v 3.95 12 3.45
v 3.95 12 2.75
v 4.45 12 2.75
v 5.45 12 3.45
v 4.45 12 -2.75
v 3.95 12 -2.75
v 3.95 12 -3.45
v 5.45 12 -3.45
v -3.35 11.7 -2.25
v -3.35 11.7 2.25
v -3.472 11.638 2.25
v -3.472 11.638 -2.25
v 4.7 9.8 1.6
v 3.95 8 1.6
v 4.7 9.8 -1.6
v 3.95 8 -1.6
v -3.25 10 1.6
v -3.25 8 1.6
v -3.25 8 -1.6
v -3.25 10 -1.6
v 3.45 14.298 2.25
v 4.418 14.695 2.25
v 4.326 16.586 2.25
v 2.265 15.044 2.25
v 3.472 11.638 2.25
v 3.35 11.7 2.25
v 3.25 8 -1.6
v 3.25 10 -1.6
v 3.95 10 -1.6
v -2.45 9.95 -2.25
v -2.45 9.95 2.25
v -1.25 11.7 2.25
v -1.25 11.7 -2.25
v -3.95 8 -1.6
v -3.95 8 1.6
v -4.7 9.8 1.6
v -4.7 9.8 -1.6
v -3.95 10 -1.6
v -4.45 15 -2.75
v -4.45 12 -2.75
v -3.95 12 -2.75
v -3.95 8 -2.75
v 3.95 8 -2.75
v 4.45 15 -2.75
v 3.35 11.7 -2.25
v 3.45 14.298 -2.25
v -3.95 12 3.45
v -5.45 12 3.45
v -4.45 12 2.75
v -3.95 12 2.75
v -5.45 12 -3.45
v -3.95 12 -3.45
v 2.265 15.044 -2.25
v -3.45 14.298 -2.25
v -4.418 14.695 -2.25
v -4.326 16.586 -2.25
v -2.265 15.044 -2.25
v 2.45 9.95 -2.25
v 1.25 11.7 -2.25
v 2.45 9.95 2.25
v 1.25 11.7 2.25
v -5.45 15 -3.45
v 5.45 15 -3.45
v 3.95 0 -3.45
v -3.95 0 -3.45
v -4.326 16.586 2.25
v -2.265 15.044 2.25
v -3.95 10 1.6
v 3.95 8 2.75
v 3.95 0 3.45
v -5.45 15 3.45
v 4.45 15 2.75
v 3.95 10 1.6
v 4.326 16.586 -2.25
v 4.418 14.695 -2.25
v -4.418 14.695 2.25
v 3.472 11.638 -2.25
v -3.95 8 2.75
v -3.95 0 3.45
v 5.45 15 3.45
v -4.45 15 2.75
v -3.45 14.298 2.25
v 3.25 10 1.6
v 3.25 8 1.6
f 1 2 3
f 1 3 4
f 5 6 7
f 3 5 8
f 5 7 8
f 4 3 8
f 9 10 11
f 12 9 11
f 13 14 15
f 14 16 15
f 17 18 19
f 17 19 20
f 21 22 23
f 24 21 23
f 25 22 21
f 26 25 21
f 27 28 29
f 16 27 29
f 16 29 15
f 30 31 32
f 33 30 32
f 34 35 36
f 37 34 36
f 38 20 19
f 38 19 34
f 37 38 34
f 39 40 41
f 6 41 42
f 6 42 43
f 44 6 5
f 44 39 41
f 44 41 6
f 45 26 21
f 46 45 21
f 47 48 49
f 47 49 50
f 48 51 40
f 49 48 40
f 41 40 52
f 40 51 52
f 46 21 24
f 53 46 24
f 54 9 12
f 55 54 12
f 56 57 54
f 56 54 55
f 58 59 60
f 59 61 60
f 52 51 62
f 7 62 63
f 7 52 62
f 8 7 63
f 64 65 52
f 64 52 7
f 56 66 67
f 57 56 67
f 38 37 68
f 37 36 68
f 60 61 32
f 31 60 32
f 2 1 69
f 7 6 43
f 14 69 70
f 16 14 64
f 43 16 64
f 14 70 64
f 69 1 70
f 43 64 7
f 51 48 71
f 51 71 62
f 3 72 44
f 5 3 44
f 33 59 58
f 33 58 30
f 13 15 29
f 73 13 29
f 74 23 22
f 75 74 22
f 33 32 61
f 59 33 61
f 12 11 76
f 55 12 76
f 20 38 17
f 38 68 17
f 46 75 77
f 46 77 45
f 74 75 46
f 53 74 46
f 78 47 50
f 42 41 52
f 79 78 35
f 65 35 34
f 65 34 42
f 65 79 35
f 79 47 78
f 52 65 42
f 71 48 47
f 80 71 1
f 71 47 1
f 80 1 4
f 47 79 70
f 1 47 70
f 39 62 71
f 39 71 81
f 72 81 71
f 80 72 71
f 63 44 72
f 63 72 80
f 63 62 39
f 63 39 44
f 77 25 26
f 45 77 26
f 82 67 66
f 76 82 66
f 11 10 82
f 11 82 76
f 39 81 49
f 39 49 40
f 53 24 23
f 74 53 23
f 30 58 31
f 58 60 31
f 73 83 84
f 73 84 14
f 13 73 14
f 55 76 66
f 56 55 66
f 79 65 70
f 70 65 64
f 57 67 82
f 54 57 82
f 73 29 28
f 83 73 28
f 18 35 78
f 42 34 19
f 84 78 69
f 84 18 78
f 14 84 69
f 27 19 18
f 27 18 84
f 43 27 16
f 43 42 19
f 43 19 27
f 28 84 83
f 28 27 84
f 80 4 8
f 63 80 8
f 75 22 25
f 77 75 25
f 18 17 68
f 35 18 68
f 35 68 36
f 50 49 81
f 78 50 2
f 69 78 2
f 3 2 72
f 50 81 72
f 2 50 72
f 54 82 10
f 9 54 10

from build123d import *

# Parameters (mm, degrees)
SKETCH1_W                       = 7.9
SKETCH1_H                       = 6.9
BOSS_EXTRUDE1_DEPTH             = 12
SKETCH2_W                       = 10.9
SKETCH2_H                       = 6.9
BOSS_EXTRUDE2_DEPTH             = 3
SKETCH3_W                       = 8.9
SKETCH3_H                       = 5.5
CUT_EXTRUDE1_DEPTH              = 7
SKETCH4_W                       = 0.7
SKETCH4_H                       = 2
BOSS_EXTRUDE3_DEPTH             = 1.6
BOSS_EXTRUDE3_DEPTH_BACK        = 1.6
BOSS_EXTRUDE4_DEPTH             = 2.25
BOSS_EXTRUDE4_DEPTH_BACK        = 2.25
BOSS_EXTRUDE5_REACH             = 18.328
BOSS_EXTRUDE5_DIRECTION_2_REACH = 18.328


with BuildPart() as part:
    # Sketch1 → Boss-Extrude1 (new body)
    with BuildSketch(Plane(origin=(0, 0, 0), x_dir=(1, 0, 0), z_dir=(0, 1, 0))):
        Rectangle(SKETCH1_W, SKETCH1_H)
    extrude(amount=BOSS_EXTRUDE1_DEPTH)

    # Sketch2 → Boss-Extrude2 (add)
    with BuildSketch(Plane(origin=(0, 12, 0), x_dir=(1, 0, 0), z_dir=(0, 1, 0))):
        Rectangle(SKETCH2_W, SKETCH2_H)
    extrude(amount=BOSS_EXTRUDE2_DEPTH)

    # Sketch3 → Cut-Extrude1 (cut)
    with BuildSketch(Plane(origin=(0, 15, 0), x_dir=(1, 0, 0), z_dir=(0, 1, 0))):
        Rectangle(SKETCH3_W, SKETCH3_H)
    extrude(amount=-CUT_EXTRUDE1_DEPTH, mode=Mode.SUBTRACT)

    # Sketch4 → Boss-Extrude3 (add, two sides)
    with BuildSketch(Plane.XY) as boss_extrude3_sk:
        Polygon((-3.95, 10), (-3.95, 8), (-4.7, 9.8), align=None)
        with Locations((-3.6, 9)):
            Rectangle(SKETCH4_W, SKETCH4_H)
    boss_extrude3 = extrude(amount=BOSS_EXTRUDE3_DEPTH)
    boss_extrude3 = boss_extrude3 + extrude(boss_extrude3_sk.sketch, amount=-BOSS_EXTRUDE3_DEPTH_BACK)

    # Mirror1: Boss-Extrude3 across plane
    add(boss_extrude3.mirror(Plane(origin=(0, 0, 0), x_dir=(0, 0, 1), z_dir=(1, 0, 0))))


with BuildPart() as body_2:
    # Sketch5 → Boss-Extrude4 (new, two sides)
    with BuildSketch(Plane.XY) as boss_extrude4_sk:
        Polygon((-1.25, 11.7), (1.25, 11.7), (2.45, 9.95), (-2.45, 9.95), align=None)
    extrude(amount=BOSS_EXTRUDE4_DEPTH)
    extrude(boss_extrude4_sk.sketch, amount=-BOSS_EXTRUDE4_DEPTH_BACK)


with BuildPart() as body_3:

    # Boss-Extrude5: up to this face of the body (flat: up to its plane)
    boss_extrude5_end = Plane(body_2.part.faces().sort_by_distance((0, 10.730405405, 2.25))[0])
    # Sketch6 → Boss-Extrude5 (new, up to the picked face)
    with BuildSketch(Plane.XY, mode=Mode.PRIVATE) as boss_extrude5_sk1:
        Polygon((3.471778858, 11.63828639), (3.35, 11.7), (3.449808304, 14.298083583), (2.265137871, 15.044110369), (4.325591119, 16.585526334), (4.418044618, 14.695177149), align=None)
    boss_extrude5_tool1 = split(extrude(boss_extrude5_sk1.sketch, amount=BOSS_EXTRUDE5_REACH, mode=Mode.PRIVATE), bisect_by=boss_extrude5_end, keep=Keep.BOTH, mode=Mode.PRIVATE)
    # Sketch6 → Boss-Extrude5 (new, up to the picked face)
    with BuildSketch(Plane.XY, mode=Mode.PRIVATE) as boss_extrude5_sk2:
        Polygon((-4.325591119, 16.585526334), (-2.265137871, 15.044110369), (-3.449808304, 14.298083583), (-3.35, 11.7), (-3.471778858, 11.63828639), (-4.418044618, 14.695177149), align=None)
    boss_extrude5_tool2 = split(extrude(boss_extrude5_sk2.sketch, amount=BOSS_EXTRUDE5_REACH, mode=Mode.PRIVATE), bisect_by=boss_extrude5_end, keep=Keep.BOTH, mode=Mode.PRIVATE)
    add(boss_extrude5_tool1.solids().sort_by(Axis((3.652081, 14.612353, 0), (0, 0, 1)))[0])
    add(boss_extrude5_tool2.solids().sort_by(Axis((-3.652081, 14.612353, 0), (0, 0, 1)))[0])


    # Boss-Extrude5 direction 2: up to this face of the body (flat: up to its plane)
    boss_extrude5_direction_2_end = Plane(body_2.part.faces().sort_by_distance((0, 10.730405405, -2.25))[0])
    # Sketch6 → Boss-Extrude5 direction 2 (add, up to the picked face)
    with BuildSketch(Plane.XY, mode=Mode.PRIVATE) as boss_extrude5_direction_2_sk1:
        Polygon((3.471778858, 11.63828639), (3.35, 11.7), (3.449808304, 14.298083583), (2.265137871, 15.044110369), (4.325591119, 16.585526334), (4.418044618, 14.695177149), align=None)
    boss_extrude5_direction_2_tool1 = split(extrude(boss_extrude5_direction_2_sk1.sketch, amount=-BOSS_EXTRUDE5_DIRECTION_2_REACH, mode=Mode.PRIVATE), bisect_by=boss_extrude5_direction_2_end, keep=Keep.BOTH, mode=Mode.PRIVATE)
    # Sketch6 → Boss-Extrude5 direction 2 (add, up to the picked face)
    with BuildSketch(Plane.XY, mode=Mode.PRIVATE) as boss_extrude5_direction_2_sk2:
        Polygon((-4.325591119, 16.585526334), (-2.265137871, 15.044110369), (-3.449808304, 14.298083583), (-3.35, 11.7), (-3.471778858, 11.63828639), (-4.418044618, 14.695177149), align=None)
    boss_extrude5_direction_2_tool2 = split(extrude(boss_extrude5_direction_2_sk2.sketch, amount=-BOSS_EXTRUDE5_DIRECTION_2_REACH, mode=Mode.PRIVATE), bisect_by=boss_extrude5_direction_2_end, keep=Keep.BOTH, mode=Mode.PRIVATE)
    add(boss_extrude5_direction_2_tool1.solids().sort_by(Axis((3.652081, 14.612353, 0), (0, 0, -1)))[0])
    add(boss_extrude5_direction_2_tool2.solids().sort_by(Axis((-3.652081, 14.612353, 0), (0, 0, -1)))[0])


solid = Compound([part.part, body_2.part, body_3.part])
